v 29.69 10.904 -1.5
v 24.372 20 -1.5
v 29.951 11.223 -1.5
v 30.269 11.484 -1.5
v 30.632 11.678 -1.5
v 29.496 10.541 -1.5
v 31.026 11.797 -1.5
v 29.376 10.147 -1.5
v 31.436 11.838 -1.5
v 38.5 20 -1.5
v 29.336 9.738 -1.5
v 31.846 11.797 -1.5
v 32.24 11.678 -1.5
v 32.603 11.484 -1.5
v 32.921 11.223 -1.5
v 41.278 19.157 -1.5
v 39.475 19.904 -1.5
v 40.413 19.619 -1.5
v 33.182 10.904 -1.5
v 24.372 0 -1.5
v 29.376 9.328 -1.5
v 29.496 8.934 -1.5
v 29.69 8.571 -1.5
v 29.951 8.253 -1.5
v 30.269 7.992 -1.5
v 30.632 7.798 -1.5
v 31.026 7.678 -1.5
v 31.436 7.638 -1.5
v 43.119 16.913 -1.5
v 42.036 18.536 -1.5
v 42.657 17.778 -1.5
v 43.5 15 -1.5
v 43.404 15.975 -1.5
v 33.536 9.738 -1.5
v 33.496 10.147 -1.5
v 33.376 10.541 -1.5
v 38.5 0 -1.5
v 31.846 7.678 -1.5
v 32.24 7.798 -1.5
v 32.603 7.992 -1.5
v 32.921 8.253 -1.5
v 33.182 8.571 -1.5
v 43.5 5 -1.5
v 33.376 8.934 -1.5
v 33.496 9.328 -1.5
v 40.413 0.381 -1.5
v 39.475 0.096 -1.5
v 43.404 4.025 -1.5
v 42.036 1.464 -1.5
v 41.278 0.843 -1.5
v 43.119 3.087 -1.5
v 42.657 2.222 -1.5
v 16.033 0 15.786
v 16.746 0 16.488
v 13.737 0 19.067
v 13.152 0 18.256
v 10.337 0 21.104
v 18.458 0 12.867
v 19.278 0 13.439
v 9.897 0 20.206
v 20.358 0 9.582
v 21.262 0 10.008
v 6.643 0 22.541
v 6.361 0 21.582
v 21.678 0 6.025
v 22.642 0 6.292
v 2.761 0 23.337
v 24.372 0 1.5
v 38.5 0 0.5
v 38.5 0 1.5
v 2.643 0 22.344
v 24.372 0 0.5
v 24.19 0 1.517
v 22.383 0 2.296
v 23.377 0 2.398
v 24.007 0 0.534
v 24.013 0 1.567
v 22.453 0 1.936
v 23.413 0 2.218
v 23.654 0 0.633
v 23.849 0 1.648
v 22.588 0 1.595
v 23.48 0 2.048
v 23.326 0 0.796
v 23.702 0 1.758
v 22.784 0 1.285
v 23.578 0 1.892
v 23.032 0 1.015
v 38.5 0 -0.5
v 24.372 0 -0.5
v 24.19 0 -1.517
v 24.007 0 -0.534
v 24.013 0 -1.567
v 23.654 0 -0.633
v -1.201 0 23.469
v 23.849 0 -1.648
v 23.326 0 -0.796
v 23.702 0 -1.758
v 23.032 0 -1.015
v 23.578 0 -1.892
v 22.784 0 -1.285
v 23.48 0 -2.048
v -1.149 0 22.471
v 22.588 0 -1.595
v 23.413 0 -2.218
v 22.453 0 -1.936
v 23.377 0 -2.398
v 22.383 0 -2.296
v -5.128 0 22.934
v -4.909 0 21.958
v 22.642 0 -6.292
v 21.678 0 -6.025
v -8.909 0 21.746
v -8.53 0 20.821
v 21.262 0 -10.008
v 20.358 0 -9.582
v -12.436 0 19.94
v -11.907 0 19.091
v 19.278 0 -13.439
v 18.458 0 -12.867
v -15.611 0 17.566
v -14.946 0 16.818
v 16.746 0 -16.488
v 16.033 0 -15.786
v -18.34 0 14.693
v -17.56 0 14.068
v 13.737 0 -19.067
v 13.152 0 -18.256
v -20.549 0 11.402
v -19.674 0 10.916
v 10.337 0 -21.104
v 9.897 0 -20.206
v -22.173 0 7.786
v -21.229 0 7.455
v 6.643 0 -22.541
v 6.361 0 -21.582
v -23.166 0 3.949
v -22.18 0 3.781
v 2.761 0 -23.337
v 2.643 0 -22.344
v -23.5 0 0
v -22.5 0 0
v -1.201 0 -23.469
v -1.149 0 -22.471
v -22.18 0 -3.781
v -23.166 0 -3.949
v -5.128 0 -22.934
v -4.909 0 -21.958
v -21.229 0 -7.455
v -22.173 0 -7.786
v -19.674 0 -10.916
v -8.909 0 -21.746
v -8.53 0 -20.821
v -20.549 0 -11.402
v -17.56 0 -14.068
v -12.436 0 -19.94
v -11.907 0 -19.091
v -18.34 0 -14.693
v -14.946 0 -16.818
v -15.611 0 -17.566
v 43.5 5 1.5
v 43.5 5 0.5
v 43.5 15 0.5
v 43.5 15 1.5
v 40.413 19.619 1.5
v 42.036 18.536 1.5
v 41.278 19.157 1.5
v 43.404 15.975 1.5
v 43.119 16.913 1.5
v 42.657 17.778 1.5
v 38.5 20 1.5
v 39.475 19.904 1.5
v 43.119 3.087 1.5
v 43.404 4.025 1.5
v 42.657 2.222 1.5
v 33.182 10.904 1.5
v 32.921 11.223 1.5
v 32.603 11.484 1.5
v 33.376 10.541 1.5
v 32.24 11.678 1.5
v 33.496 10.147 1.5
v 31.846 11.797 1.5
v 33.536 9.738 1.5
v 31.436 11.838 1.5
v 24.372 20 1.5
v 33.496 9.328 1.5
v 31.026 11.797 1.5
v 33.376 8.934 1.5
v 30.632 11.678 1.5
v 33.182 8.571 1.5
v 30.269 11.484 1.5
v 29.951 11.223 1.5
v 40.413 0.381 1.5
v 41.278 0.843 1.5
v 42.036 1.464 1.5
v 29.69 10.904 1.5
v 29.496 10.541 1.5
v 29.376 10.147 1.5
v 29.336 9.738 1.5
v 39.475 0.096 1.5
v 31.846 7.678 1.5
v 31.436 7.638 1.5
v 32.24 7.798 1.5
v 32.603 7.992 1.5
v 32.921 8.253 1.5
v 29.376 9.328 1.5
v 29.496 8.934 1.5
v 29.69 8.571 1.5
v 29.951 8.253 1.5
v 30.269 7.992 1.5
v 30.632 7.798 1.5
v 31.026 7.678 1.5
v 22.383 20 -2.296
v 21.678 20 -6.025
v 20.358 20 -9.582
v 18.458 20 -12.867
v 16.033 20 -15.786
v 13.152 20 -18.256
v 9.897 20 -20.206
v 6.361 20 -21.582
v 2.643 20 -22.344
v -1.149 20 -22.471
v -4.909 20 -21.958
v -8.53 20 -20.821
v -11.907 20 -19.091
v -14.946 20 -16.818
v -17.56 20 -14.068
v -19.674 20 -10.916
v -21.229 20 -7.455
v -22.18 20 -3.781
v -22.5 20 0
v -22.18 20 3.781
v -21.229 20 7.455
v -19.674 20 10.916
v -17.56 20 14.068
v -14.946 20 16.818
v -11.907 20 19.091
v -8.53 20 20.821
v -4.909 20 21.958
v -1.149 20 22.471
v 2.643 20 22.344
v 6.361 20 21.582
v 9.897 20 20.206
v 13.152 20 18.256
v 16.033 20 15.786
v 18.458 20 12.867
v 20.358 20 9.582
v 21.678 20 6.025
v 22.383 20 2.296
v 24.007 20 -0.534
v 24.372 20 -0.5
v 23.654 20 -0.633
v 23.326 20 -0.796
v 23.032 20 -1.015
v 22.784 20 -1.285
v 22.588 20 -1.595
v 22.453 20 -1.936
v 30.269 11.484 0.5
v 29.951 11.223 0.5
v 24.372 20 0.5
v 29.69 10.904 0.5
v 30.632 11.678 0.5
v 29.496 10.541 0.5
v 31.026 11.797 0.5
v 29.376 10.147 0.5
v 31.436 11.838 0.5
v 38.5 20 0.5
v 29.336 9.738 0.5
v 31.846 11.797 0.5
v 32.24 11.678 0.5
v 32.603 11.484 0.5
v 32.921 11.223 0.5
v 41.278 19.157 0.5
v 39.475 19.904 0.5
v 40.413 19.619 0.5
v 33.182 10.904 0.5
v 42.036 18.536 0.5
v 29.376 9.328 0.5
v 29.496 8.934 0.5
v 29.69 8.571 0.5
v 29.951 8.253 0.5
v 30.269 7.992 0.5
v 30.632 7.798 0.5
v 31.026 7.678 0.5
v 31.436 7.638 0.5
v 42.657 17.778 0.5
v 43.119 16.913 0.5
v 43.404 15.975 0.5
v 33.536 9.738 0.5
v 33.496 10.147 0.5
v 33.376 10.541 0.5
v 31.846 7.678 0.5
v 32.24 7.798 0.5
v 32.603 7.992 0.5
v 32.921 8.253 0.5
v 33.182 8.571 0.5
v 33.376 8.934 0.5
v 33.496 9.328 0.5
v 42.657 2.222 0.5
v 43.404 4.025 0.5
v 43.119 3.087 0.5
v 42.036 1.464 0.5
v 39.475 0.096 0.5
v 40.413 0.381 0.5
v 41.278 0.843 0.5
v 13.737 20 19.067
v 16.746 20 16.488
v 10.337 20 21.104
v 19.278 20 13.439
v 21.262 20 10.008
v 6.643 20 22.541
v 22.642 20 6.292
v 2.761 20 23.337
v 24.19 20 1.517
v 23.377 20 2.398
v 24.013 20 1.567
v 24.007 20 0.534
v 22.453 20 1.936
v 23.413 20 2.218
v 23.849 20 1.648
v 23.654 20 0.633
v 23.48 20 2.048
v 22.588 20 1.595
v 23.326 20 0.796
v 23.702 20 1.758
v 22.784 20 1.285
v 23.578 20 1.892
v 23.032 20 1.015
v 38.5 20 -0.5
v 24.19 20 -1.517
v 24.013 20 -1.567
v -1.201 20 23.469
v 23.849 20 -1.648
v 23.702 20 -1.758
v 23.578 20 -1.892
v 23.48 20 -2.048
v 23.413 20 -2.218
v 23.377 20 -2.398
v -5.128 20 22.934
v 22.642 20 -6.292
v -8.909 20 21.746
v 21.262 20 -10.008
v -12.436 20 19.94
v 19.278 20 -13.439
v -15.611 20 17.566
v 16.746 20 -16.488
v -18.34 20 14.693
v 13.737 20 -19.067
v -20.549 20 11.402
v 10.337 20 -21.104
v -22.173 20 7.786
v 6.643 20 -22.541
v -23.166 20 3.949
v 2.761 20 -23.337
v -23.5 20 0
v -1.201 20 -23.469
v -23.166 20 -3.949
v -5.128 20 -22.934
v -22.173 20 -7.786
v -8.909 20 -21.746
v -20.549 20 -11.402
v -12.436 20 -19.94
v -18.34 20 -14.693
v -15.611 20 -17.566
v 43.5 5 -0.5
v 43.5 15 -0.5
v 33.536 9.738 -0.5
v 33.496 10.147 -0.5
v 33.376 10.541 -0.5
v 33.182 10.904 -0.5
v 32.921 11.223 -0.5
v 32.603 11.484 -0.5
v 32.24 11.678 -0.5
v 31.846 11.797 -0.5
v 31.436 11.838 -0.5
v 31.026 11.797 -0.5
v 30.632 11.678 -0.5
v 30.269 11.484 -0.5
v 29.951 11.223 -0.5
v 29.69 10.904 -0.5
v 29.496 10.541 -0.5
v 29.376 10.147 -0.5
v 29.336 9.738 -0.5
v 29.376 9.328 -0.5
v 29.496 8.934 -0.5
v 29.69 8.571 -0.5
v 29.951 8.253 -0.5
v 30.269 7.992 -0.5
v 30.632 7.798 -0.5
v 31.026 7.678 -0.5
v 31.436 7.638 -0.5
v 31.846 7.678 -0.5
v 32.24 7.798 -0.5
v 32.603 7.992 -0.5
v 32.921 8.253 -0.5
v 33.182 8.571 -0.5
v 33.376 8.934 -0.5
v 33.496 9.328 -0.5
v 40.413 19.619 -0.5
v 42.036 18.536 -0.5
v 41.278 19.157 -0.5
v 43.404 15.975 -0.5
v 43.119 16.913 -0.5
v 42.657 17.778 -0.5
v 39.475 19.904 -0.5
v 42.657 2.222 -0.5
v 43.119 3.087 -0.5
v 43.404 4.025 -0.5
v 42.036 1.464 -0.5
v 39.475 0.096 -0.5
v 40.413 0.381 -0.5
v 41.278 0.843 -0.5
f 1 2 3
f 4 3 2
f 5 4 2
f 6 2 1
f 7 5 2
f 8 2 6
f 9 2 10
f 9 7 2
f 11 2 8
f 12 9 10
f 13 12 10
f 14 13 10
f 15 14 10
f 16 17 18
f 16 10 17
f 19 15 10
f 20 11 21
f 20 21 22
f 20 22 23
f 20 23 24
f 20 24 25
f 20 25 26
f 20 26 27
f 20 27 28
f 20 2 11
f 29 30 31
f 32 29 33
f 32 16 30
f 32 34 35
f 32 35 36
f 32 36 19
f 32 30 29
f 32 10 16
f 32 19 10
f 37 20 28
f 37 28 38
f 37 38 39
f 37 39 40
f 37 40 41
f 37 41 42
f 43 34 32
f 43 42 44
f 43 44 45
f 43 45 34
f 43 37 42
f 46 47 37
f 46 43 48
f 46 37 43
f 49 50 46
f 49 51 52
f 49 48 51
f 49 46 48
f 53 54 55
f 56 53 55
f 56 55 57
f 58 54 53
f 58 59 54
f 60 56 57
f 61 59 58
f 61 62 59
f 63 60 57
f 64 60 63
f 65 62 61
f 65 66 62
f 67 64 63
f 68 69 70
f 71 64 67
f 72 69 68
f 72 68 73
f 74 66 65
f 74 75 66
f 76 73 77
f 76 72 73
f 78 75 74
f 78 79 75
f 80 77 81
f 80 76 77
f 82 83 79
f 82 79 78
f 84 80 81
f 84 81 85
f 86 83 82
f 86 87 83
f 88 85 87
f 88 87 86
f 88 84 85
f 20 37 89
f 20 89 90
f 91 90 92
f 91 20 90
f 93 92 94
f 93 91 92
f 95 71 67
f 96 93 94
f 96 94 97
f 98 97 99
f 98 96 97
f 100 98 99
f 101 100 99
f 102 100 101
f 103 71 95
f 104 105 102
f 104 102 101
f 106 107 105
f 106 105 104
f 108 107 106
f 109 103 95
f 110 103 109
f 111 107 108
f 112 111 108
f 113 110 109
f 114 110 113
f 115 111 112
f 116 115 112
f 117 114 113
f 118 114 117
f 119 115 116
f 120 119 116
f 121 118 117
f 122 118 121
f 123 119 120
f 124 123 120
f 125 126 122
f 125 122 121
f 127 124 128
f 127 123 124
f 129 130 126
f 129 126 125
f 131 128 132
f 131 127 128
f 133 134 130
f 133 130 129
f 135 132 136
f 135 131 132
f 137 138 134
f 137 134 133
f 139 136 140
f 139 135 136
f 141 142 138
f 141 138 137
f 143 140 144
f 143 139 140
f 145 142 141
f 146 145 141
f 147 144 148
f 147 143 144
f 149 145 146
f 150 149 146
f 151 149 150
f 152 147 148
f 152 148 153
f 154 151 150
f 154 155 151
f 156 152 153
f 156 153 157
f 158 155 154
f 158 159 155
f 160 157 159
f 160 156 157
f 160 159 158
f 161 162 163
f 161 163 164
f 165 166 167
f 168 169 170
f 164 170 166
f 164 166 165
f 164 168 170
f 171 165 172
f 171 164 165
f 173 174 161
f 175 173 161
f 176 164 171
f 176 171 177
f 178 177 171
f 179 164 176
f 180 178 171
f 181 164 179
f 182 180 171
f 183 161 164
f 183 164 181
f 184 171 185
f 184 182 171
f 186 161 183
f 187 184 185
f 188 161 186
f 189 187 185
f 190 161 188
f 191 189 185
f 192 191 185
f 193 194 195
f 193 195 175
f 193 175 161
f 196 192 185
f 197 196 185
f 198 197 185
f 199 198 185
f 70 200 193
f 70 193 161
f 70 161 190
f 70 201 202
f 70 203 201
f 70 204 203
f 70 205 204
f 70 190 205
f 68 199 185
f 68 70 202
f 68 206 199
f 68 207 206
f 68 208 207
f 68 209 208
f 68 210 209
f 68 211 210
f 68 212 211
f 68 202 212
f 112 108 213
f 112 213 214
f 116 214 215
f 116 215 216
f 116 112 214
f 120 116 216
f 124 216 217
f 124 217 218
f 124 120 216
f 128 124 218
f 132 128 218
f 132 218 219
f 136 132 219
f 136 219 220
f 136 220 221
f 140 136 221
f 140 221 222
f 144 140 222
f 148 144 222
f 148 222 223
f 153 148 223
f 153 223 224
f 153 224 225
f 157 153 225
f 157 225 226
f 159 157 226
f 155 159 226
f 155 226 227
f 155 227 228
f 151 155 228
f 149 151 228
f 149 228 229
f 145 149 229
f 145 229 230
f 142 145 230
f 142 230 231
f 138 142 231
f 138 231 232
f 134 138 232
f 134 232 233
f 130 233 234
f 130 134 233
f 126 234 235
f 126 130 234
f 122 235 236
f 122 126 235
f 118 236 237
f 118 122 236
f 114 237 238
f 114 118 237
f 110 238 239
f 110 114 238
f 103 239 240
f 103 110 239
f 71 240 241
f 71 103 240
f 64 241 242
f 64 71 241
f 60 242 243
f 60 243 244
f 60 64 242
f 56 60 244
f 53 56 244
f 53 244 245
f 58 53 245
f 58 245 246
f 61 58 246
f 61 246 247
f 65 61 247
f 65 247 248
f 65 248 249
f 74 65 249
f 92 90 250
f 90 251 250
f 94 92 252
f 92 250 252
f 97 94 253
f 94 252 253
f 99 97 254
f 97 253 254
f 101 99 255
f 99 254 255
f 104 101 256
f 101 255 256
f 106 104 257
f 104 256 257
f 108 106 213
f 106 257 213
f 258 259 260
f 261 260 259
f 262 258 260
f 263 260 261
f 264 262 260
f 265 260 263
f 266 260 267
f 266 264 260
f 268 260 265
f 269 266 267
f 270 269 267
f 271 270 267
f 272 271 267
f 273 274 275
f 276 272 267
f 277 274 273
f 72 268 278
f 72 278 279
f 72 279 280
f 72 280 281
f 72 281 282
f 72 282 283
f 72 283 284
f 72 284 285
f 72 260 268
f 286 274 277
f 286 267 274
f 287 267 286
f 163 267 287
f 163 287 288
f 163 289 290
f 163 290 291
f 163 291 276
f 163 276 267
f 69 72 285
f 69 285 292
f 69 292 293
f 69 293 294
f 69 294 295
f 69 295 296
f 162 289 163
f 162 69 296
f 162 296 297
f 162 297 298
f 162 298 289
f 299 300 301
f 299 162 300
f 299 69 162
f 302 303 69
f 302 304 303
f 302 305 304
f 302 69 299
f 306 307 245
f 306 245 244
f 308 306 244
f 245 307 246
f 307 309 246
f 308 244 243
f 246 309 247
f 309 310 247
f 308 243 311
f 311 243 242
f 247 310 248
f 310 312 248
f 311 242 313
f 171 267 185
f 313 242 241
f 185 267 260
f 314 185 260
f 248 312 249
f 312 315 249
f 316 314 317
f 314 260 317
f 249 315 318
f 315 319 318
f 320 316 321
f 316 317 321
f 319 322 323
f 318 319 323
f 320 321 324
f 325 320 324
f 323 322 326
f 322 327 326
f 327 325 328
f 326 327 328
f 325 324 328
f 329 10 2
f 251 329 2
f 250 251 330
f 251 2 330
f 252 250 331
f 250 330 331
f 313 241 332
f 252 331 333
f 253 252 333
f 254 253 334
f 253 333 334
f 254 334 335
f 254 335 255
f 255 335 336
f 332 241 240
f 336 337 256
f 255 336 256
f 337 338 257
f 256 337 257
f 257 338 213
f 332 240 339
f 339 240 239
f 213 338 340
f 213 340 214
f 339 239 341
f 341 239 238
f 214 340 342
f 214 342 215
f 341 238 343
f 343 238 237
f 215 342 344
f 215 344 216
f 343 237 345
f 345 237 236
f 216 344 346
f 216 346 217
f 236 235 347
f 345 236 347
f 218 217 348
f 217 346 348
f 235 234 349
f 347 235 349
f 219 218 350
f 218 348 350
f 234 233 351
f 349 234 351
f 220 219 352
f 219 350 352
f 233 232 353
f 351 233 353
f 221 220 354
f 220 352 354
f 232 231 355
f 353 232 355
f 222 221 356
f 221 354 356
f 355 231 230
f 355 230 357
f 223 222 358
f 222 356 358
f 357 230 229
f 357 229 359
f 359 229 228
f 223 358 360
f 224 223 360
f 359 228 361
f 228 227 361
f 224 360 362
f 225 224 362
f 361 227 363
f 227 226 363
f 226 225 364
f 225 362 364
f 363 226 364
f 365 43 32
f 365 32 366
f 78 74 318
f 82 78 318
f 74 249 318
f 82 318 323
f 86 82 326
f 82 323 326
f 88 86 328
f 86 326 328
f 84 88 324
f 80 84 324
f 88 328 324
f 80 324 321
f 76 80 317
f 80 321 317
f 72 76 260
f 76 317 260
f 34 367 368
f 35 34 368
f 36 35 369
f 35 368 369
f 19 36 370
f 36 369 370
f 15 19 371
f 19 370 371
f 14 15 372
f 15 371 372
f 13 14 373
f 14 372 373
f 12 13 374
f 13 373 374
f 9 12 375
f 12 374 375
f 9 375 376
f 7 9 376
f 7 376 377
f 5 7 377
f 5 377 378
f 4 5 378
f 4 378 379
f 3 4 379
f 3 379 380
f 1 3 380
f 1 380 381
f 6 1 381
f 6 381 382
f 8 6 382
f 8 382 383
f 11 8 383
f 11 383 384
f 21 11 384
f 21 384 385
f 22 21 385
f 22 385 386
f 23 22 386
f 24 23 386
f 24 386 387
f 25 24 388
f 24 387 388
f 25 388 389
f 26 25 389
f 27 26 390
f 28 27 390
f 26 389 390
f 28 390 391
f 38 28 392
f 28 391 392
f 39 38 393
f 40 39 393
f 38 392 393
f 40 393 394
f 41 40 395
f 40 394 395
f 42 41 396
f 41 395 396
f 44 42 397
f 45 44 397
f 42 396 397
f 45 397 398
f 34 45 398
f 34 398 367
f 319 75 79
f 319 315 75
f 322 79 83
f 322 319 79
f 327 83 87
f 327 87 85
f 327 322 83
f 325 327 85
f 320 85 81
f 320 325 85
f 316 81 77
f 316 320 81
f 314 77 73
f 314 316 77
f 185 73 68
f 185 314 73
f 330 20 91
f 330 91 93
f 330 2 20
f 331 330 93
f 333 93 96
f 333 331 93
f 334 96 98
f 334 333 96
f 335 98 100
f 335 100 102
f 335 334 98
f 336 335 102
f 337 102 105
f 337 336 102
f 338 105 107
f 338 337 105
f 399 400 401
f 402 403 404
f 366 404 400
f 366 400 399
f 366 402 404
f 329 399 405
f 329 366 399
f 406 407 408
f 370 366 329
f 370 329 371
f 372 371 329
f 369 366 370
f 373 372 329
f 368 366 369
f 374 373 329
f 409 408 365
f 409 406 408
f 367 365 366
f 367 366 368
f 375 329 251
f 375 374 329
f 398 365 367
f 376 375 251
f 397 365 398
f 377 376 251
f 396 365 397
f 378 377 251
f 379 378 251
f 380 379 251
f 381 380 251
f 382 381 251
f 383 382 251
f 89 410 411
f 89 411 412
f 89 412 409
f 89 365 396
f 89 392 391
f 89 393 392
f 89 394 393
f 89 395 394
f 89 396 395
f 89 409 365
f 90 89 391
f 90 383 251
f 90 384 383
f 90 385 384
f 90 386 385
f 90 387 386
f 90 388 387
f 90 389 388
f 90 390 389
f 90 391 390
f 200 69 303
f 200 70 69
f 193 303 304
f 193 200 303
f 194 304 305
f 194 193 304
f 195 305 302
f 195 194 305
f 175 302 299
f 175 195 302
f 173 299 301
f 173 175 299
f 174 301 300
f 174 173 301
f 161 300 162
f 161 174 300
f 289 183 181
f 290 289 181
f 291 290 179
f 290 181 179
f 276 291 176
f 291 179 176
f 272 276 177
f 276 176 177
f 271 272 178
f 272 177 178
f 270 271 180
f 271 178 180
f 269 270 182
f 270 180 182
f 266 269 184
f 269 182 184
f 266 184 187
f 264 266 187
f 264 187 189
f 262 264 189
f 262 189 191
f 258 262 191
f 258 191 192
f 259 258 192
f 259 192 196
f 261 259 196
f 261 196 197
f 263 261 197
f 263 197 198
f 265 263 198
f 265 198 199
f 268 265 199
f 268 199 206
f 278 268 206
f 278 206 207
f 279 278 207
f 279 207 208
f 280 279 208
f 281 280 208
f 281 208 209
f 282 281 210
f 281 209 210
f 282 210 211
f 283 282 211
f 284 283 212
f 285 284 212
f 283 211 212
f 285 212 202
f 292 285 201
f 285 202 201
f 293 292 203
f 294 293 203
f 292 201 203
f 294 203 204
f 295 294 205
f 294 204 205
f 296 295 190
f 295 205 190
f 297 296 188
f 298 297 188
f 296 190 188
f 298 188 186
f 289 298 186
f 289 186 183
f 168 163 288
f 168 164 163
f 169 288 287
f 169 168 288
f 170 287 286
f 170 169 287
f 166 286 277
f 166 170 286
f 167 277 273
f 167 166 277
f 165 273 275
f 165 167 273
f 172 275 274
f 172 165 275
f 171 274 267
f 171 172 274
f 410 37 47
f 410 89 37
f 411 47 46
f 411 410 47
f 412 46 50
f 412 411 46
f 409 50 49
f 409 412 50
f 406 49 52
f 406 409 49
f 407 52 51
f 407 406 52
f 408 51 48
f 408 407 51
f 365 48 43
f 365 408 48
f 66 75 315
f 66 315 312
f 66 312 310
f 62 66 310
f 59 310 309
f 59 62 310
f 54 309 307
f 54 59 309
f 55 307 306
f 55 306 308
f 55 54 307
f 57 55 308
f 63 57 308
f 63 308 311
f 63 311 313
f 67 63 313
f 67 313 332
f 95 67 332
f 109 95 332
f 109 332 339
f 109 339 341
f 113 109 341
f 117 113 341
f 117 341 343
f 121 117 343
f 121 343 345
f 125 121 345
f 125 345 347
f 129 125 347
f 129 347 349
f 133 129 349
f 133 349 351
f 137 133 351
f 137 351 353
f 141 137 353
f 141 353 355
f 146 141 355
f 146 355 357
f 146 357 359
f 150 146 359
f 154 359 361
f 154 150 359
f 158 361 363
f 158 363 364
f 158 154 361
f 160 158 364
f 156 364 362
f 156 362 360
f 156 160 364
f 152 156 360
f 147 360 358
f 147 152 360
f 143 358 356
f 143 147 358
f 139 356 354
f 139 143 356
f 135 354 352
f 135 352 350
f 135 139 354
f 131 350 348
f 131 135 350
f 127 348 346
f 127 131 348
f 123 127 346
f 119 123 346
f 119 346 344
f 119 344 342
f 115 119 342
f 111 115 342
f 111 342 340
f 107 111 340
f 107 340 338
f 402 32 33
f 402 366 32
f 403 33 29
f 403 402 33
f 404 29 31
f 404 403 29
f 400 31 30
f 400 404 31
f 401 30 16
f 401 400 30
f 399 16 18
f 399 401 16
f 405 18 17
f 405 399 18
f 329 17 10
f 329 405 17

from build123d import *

# Parameters (mm, degrees)
EXTRUDE_1_DEPTH       = 20
FILLET_1_R            = 2
FILLET_2_R            = 1
FILLET_3_R            = 5
HOLE_WIZARD_M51_D     = 4.2
HOLE_WIZARD_M51_DEPTH = 38.5
HOLE_WIZARD_M51_TIP   = 1.2618073


with BuildPart() as part:
    # Эскиз1 → Бобышка-Вытянуть1 (new body)
    with BuildSketch(Plane(origin=(0, 0, 0), x_dir=(1, 0, 0), z_dir=(0, 1, 0))):
        with BuildLine():
            Line((43.5, -1.5), (23.452078799, -1.5))
            ThreePointArc((23.452078799, -1.5), (-23.5, 0), (23.452078799, 1.5))
            Line((23.452078799, 1.5), (43.5, 1.5))
            Line((43.5, 1.5), (43.5, 0.5))
            Line((43.5, 0.5), (22.494443758, 0.5))
            ThreePointArc((22.494443758, 0.5), (-22.5, 0), (22.494443758, -0.5))
            Line((22.494443758, -0.5), (43.5, -0.5))
            Line((43.5, -0.5), (43.5, -1.5))
        make_face()
    extrude(amount=EXTRUDE_1_DEPTH)

    # Скругление1
    fillet_1_edges = [part.edges().sort_by_distance(p)[0] for p in [
        (22.494443758, 10, -0.5),
        (22.494443758, 10, 0.5),
    ]]
    fillet(fillet_1_edges, radius=FILLET_1_R)

    # Скругление2
    fillet_2_edges = [part.edges().sort_by_distance(p)[0] for p in [
        (23.452078799, 10, 1.5),
        (23.452078799, 10, -1.5),
    ]]
    fillet(fillet_2_edges, radius=FILLET_2_R)

    # Скругление3
    fillet_3_edges = [part.edges().sort_by_distance(p)[0] for p in [
        (43.5, 0, -1),
        (43.5, 20, 1),
        (43.5, 20, -1),
        (43.5, 0, 1),
    ]]
    fillet(fillet_3_edges, radius=FILLET_3_R)

    # Отверстие обработанное метчиком M51
    with Locations(Plane(origin=(0, 0, -1.5), x_dir=(-1, 0, 0), z_dir=(0, 0, -1))):
        with Locations((-31.436057607, 9.737709053)):
            Hole(HOLE_WIZARD_M51_D / 2, depth=HOLE_WIZARD_M51_DEPTH)
            with Locations((0, 0, -(HOLE_WIZARD_M51_DEPTH + HOLE_WIZARD_M51_TIP / 2))):  # 118° drill point
                Cone(0, HOLE_WIZARD_M51_D / 2, HOLE_WIZARD_M51_TIP, mode=Mode.SUBTRACT)


solid = part.part
